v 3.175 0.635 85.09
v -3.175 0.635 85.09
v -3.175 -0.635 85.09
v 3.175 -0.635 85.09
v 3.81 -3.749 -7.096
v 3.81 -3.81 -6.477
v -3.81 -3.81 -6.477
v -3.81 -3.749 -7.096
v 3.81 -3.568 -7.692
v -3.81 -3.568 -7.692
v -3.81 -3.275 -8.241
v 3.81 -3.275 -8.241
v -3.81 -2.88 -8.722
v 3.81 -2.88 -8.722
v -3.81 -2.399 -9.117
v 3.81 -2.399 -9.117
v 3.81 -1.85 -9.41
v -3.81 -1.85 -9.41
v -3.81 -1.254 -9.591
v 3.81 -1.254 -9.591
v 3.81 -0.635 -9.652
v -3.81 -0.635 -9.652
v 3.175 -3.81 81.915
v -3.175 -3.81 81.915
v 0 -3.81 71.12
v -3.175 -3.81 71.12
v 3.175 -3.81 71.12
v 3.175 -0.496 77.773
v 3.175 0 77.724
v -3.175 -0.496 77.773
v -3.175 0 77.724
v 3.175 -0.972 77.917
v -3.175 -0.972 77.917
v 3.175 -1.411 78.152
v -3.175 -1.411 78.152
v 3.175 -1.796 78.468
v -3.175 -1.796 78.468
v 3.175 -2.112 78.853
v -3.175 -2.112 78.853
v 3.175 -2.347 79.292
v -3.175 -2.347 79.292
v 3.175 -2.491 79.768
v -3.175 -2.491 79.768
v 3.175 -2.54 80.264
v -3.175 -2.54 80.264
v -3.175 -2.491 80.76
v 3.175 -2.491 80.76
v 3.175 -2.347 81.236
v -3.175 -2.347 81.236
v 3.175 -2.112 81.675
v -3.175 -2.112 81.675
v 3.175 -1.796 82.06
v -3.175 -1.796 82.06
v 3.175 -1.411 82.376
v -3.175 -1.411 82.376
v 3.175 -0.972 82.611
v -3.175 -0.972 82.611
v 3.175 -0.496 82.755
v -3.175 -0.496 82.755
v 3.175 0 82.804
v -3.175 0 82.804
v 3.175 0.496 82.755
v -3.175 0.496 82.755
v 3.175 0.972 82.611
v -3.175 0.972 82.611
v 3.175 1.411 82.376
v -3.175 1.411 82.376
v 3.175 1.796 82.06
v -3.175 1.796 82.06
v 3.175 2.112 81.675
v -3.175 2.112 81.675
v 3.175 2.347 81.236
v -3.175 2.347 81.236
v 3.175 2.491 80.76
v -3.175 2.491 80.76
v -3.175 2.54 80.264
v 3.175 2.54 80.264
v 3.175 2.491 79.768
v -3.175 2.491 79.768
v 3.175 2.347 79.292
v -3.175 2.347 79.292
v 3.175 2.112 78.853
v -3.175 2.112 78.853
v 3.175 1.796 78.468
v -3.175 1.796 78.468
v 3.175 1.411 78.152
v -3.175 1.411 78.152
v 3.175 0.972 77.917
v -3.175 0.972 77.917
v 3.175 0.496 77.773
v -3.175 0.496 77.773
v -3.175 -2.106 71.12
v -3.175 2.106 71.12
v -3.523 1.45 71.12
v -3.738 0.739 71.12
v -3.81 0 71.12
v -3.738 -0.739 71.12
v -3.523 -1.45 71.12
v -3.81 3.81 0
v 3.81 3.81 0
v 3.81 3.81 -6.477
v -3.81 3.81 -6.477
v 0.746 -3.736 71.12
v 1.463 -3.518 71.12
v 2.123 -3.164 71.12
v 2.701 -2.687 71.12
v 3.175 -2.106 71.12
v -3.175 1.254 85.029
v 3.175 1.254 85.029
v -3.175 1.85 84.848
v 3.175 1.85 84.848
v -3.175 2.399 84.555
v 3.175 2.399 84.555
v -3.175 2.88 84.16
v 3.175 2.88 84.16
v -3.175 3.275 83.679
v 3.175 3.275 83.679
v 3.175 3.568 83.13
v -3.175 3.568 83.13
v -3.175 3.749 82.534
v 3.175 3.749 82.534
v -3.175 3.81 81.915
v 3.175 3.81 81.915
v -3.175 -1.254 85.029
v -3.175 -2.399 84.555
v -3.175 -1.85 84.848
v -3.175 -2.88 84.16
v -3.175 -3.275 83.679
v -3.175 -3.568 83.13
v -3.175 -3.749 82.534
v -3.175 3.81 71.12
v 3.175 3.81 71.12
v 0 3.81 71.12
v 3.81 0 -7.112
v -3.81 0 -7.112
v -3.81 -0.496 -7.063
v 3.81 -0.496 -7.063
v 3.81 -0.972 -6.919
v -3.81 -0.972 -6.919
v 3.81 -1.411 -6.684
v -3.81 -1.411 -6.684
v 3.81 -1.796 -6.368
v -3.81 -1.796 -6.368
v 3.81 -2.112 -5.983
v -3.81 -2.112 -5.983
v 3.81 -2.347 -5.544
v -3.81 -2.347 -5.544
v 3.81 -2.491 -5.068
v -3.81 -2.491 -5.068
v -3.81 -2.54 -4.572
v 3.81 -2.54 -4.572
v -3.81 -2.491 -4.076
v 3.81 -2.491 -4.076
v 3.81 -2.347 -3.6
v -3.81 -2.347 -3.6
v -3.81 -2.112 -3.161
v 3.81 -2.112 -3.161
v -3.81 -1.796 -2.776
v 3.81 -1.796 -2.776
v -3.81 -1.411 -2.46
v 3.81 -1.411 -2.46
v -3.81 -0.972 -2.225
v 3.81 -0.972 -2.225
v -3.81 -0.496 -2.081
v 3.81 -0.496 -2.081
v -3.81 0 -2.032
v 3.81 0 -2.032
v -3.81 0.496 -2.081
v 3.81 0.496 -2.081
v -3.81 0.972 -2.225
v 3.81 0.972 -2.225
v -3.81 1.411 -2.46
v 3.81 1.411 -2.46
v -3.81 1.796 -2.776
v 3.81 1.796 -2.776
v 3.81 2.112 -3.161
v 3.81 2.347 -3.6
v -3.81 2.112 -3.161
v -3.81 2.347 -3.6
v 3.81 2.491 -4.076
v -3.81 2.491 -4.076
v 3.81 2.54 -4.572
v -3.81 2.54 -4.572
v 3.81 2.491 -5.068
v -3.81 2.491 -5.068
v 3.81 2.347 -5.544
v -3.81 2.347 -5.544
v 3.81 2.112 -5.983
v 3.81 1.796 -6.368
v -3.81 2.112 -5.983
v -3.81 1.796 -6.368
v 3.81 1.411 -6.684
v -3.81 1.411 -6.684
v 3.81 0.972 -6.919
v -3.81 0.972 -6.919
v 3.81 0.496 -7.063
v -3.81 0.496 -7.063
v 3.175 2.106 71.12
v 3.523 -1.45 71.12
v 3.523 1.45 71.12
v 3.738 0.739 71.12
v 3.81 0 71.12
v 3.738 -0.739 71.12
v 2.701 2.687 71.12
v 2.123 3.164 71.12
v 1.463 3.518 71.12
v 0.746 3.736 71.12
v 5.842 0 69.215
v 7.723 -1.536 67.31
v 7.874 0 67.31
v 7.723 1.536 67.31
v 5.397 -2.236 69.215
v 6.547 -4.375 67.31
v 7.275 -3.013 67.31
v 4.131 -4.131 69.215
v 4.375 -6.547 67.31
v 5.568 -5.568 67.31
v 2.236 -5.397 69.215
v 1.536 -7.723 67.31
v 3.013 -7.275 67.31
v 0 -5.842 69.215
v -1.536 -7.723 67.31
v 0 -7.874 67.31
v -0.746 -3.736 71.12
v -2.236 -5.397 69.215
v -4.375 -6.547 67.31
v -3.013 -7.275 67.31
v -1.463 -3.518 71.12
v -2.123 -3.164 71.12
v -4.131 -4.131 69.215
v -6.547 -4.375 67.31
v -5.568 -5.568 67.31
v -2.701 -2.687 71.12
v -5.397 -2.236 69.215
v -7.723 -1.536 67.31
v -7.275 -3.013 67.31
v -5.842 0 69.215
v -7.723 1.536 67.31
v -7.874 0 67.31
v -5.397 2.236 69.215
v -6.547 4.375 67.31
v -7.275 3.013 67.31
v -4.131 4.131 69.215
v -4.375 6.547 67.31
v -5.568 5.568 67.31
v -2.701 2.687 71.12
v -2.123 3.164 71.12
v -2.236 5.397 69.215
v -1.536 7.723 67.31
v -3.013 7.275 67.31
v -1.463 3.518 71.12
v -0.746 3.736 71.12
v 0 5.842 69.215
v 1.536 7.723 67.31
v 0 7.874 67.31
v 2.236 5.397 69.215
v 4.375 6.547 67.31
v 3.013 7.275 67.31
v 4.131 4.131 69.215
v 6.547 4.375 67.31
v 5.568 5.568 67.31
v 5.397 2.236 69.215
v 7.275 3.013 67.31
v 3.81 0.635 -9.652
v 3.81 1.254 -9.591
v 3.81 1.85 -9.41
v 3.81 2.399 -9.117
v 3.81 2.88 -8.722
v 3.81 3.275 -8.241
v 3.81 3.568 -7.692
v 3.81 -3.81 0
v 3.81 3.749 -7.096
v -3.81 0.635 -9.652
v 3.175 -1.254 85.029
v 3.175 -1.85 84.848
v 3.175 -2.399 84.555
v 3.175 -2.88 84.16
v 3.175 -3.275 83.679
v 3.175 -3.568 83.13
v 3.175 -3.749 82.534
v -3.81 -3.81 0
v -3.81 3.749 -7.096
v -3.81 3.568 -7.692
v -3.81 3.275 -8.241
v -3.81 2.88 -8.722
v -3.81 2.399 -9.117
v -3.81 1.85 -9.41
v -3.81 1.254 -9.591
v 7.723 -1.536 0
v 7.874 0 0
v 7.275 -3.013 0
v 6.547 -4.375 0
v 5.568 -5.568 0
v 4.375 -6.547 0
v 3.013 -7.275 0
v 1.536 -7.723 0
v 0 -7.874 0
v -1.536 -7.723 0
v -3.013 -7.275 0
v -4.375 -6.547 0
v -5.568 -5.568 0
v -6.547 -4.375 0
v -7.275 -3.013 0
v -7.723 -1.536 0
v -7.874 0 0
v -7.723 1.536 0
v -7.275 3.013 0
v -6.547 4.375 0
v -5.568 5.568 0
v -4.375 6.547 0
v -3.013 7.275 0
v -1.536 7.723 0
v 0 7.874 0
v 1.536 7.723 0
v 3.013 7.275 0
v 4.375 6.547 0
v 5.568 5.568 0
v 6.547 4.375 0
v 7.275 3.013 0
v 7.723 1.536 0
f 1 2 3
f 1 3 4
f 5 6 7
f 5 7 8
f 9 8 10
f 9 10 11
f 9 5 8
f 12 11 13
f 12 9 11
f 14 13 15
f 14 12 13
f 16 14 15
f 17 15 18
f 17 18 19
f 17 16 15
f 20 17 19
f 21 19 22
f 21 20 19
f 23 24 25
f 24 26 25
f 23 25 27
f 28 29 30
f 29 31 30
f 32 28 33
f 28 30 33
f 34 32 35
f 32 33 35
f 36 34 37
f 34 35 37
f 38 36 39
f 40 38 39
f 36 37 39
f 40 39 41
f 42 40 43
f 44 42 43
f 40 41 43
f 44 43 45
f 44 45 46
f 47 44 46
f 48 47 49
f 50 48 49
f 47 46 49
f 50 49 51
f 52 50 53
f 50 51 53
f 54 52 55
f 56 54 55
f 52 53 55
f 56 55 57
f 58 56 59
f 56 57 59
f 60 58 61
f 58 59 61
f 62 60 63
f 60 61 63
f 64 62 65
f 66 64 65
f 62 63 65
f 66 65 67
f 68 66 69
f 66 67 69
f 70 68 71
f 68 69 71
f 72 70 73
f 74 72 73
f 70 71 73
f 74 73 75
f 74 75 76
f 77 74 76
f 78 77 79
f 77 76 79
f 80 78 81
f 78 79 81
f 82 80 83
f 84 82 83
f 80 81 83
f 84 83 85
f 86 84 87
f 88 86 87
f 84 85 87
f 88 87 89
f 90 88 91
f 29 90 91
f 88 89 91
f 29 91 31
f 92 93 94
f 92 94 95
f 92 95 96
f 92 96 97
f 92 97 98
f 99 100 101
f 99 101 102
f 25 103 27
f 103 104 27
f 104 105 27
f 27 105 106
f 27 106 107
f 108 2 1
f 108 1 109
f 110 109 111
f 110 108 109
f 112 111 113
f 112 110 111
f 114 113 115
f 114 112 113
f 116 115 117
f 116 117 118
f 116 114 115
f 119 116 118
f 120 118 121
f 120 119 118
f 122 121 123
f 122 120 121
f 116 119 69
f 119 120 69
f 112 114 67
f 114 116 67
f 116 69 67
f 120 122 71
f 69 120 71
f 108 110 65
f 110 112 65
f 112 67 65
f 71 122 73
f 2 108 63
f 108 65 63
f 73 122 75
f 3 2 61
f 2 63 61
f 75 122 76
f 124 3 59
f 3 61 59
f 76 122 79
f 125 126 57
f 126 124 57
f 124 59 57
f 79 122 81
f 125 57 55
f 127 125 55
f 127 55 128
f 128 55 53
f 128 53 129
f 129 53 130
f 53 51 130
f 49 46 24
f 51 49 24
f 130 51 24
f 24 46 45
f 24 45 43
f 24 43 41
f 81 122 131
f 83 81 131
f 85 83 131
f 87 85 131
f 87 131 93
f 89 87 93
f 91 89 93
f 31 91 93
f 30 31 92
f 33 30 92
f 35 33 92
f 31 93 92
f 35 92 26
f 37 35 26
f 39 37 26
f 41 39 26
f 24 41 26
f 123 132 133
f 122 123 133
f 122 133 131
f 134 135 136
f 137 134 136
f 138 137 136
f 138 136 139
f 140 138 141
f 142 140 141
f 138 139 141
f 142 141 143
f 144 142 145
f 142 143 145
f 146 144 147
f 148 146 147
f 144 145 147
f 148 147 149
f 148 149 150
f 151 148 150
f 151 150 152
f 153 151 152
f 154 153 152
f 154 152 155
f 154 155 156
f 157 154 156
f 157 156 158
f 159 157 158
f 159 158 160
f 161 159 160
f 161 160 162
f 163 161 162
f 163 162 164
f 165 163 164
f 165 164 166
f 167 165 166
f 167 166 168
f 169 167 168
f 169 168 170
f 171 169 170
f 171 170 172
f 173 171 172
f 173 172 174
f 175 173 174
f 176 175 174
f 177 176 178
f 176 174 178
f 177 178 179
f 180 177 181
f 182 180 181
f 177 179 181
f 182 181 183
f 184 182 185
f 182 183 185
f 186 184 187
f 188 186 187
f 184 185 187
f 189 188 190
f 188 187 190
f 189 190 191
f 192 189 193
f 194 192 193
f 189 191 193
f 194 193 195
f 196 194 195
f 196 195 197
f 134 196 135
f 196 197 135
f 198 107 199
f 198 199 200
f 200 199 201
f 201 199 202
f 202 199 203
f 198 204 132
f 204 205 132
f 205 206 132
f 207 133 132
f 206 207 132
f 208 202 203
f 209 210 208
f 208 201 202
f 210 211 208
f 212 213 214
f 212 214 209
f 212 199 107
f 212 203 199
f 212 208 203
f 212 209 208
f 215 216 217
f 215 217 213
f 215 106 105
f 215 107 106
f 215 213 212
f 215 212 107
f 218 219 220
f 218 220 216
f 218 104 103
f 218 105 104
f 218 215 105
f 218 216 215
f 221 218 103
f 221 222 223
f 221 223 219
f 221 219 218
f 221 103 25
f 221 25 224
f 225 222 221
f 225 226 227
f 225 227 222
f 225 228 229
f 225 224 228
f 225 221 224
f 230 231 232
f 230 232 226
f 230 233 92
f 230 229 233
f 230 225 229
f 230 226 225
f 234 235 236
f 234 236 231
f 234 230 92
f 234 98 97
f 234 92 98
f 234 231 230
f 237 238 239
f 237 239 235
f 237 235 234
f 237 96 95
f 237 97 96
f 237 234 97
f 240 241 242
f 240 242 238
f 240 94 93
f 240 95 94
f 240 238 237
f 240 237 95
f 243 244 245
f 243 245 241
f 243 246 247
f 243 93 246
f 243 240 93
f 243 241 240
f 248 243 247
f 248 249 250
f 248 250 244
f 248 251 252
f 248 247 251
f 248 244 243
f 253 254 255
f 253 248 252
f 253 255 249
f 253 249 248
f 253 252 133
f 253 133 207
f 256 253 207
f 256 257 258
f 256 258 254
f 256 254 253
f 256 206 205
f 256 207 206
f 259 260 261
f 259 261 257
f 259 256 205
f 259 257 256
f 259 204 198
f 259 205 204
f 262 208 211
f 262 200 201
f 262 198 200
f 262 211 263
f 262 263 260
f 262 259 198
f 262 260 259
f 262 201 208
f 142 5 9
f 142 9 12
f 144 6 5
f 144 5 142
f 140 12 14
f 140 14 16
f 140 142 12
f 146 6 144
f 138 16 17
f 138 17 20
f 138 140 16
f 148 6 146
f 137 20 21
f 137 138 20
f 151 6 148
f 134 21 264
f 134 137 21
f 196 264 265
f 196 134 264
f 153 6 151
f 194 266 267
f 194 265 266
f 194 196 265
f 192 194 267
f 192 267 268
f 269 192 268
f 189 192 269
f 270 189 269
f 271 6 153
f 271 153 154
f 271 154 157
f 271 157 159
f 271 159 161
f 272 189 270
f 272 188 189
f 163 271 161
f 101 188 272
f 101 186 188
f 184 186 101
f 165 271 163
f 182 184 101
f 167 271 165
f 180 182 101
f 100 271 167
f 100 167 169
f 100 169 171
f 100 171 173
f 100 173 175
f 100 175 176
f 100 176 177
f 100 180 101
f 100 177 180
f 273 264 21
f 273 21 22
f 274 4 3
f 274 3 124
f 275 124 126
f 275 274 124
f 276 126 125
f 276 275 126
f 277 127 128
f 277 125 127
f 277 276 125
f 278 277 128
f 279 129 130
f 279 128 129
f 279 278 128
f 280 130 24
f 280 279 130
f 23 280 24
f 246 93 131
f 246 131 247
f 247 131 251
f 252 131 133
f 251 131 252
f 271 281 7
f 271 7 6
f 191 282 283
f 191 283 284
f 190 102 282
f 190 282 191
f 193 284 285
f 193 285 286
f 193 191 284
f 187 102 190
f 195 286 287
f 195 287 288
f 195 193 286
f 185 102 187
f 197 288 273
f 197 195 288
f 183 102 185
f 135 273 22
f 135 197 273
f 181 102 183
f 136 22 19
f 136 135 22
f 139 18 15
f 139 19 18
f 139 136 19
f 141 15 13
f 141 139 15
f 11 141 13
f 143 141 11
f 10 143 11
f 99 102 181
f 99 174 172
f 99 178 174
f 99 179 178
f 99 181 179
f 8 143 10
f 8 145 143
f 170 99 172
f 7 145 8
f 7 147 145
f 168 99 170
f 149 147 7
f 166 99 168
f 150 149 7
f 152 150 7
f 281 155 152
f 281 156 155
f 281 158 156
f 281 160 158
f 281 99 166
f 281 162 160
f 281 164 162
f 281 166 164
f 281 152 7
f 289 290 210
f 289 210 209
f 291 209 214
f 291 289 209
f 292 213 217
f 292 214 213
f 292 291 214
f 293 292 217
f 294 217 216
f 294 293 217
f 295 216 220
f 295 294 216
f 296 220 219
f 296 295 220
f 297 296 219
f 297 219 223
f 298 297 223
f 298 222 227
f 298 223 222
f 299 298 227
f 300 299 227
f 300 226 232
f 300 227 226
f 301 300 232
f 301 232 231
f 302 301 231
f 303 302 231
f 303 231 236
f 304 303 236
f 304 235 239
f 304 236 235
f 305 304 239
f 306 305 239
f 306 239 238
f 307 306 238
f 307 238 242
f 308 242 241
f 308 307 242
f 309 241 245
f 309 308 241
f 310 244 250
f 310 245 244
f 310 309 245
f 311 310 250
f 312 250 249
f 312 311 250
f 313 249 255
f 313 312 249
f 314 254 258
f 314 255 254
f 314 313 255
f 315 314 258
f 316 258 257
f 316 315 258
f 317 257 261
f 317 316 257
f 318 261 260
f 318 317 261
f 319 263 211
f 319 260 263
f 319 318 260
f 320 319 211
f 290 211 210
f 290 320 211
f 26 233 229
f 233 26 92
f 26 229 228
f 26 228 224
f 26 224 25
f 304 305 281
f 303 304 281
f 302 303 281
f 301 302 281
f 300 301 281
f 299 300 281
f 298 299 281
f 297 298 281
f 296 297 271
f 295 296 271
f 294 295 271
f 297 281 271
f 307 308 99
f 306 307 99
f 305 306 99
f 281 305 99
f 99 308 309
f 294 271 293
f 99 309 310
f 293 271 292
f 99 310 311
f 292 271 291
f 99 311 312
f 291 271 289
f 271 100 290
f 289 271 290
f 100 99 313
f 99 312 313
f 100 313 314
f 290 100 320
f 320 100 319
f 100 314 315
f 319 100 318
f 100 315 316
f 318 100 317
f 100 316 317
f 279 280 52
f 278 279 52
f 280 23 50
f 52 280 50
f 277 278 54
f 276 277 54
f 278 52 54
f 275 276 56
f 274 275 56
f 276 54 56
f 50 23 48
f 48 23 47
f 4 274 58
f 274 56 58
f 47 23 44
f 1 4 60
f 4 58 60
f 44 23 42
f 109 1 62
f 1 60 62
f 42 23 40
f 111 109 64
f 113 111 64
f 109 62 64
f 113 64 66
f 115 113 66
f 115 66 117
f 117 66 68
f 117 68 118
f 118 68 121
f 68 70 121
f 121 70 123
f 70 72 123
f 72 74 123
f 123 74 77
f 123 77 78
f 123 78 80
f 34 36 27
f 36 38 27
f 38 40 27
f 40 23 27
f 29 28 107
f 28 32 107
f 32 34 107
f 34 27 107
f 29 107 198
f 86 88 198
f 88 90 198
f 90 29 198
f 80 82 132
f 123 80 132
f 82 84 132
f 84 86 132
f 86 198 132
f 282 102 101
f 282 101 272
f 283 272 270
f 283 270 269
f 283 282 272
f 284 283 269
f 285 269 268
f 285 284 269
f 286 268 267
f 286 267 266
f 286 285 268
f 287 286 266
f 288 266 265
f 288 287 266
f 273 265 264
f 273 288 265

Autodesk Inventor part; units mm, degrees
sketch "Sketch1" plane through (0, 0, 0) normal (0, 0, 1) x (1, 0, 0)
  circle A0 centre (0, 0) radius 7.874
  dimension "d0" = 15.748
extrude "Extrusion1" add sketch "Sketch1" along normal blind 67.31
ref_plane "Work Plane1" through (0, 0, 71.12) normal (0, 0, 1) x (1, 0, 0)
sketch "Sketch3" plane through (0, 0, 71.12) normal (0, 0, 1) x (1, 0, 0)
  circle A0 centre (0, 0) radius 3.81
  dimension "d4" = 7.62
loft "Loft1" add profiles "Sketch3" section 1 edges at (-7.874, 0, 67.31)
ref_plane "Work Plane5" through (0, 0, 85.09) normal (0, 0, 1) x (1, 0, 0)
ref_plane "Work Plane8" through (4.445, 0, 85.09) normal (1, 0, 0) x (0, 1, 0)
sketch "Sketch6" plane through (4.445, 0, 85.09) normal (1, 0, 0) x (0, 1, 0)
  line L0 (4.445, 0) -> (-4.445, 0) projected
  point P0 (0, -85.09)
  point P1 (0, -4.826)
  dimension "d23" = 4.826
ref_plane "Work Plane6" through (4.445, 0, 85.09) normal (1, 0, 0) x (0, 1, 0)
sketch "Sketch8" plane through (4.445, 0, 85.09) normal (1, 0, 0) x (0, 1, 0)
  line L0 (-5.08, -94.742) -> (5.08, -94.742) projected
  point P0 (0, -85.09)
  point P1 (0, -89.662)
  dimension "d31" = 5.08
sketch "Sketch9" plane through (0, 0, 0) normal (0, 0, -1) x (-1, 0, 0)
  line L0 (-3.81, 3.81) -> (3.81, 3.81)
  line L1 (3.81, 3.81) -> (3.81, -3.81)
  line L2 (3.81, -3.81) -> (-3.81, -3.81)
  line L3 (-3.81, -3.81) -> (-3.81, 3.81)
  line L4 (-3.81, 3.81) -> (3.81, -3.81) construction
  line L5 (3.81, 3.81) -> (-3.81, -3.81) construction
  point P0 (0, 0)
  dimension "d39" = 7.62
  dimension "d40" = 7.62
extrude "Extrusion6" add sketch "Sketch9" along normal blind 9.652
hole "Hole3" at (4.445, 0, -4.572) direction (-1, 0, 0) diameter 5.08 end through all both
sketch "Sketch10" plane through (0, 0, 71.12) normal (0, 0, 1) x (1, 0, 0)
  line L0 (3.175, 3.81) -> (-3.175, 3.81)
  line L1 (-3.175, 3.81) -> (-3.175, -3.81)
  line L2 (-3.175, -3.81) -> (3.175, -3.81)
  line L3 (3.175, -3.81) -> (3.175, 3.81)
  line L4 (3.175, 3.81) -> (-3.175, -3.81) construction
  line L5 (-3.175, 3.81) -> (3.175, -3.81) construction
  point P0 (0, 0)
  point P1 (0, 0)
  dimension "d50" = 6.35
  dimension "d51" = 7.62
extrude "Extrusion7" add sketch "Sketch10" along normal blind 13.97
hole "Hole4" at (4.445, 0, 80.264) direction (-1, 0, 0) diameter 5.08 end through all
fillet "Fillet1" radius 3.175 2 edges at (0, 3.81, 85.09) (0, -3.81, 85.09)
fillet "Fillet2" radius 3.175 2 edges at (0, 3.81, -9.652) (0, -3.81, -9.652)
properties part number "MockShock2"
